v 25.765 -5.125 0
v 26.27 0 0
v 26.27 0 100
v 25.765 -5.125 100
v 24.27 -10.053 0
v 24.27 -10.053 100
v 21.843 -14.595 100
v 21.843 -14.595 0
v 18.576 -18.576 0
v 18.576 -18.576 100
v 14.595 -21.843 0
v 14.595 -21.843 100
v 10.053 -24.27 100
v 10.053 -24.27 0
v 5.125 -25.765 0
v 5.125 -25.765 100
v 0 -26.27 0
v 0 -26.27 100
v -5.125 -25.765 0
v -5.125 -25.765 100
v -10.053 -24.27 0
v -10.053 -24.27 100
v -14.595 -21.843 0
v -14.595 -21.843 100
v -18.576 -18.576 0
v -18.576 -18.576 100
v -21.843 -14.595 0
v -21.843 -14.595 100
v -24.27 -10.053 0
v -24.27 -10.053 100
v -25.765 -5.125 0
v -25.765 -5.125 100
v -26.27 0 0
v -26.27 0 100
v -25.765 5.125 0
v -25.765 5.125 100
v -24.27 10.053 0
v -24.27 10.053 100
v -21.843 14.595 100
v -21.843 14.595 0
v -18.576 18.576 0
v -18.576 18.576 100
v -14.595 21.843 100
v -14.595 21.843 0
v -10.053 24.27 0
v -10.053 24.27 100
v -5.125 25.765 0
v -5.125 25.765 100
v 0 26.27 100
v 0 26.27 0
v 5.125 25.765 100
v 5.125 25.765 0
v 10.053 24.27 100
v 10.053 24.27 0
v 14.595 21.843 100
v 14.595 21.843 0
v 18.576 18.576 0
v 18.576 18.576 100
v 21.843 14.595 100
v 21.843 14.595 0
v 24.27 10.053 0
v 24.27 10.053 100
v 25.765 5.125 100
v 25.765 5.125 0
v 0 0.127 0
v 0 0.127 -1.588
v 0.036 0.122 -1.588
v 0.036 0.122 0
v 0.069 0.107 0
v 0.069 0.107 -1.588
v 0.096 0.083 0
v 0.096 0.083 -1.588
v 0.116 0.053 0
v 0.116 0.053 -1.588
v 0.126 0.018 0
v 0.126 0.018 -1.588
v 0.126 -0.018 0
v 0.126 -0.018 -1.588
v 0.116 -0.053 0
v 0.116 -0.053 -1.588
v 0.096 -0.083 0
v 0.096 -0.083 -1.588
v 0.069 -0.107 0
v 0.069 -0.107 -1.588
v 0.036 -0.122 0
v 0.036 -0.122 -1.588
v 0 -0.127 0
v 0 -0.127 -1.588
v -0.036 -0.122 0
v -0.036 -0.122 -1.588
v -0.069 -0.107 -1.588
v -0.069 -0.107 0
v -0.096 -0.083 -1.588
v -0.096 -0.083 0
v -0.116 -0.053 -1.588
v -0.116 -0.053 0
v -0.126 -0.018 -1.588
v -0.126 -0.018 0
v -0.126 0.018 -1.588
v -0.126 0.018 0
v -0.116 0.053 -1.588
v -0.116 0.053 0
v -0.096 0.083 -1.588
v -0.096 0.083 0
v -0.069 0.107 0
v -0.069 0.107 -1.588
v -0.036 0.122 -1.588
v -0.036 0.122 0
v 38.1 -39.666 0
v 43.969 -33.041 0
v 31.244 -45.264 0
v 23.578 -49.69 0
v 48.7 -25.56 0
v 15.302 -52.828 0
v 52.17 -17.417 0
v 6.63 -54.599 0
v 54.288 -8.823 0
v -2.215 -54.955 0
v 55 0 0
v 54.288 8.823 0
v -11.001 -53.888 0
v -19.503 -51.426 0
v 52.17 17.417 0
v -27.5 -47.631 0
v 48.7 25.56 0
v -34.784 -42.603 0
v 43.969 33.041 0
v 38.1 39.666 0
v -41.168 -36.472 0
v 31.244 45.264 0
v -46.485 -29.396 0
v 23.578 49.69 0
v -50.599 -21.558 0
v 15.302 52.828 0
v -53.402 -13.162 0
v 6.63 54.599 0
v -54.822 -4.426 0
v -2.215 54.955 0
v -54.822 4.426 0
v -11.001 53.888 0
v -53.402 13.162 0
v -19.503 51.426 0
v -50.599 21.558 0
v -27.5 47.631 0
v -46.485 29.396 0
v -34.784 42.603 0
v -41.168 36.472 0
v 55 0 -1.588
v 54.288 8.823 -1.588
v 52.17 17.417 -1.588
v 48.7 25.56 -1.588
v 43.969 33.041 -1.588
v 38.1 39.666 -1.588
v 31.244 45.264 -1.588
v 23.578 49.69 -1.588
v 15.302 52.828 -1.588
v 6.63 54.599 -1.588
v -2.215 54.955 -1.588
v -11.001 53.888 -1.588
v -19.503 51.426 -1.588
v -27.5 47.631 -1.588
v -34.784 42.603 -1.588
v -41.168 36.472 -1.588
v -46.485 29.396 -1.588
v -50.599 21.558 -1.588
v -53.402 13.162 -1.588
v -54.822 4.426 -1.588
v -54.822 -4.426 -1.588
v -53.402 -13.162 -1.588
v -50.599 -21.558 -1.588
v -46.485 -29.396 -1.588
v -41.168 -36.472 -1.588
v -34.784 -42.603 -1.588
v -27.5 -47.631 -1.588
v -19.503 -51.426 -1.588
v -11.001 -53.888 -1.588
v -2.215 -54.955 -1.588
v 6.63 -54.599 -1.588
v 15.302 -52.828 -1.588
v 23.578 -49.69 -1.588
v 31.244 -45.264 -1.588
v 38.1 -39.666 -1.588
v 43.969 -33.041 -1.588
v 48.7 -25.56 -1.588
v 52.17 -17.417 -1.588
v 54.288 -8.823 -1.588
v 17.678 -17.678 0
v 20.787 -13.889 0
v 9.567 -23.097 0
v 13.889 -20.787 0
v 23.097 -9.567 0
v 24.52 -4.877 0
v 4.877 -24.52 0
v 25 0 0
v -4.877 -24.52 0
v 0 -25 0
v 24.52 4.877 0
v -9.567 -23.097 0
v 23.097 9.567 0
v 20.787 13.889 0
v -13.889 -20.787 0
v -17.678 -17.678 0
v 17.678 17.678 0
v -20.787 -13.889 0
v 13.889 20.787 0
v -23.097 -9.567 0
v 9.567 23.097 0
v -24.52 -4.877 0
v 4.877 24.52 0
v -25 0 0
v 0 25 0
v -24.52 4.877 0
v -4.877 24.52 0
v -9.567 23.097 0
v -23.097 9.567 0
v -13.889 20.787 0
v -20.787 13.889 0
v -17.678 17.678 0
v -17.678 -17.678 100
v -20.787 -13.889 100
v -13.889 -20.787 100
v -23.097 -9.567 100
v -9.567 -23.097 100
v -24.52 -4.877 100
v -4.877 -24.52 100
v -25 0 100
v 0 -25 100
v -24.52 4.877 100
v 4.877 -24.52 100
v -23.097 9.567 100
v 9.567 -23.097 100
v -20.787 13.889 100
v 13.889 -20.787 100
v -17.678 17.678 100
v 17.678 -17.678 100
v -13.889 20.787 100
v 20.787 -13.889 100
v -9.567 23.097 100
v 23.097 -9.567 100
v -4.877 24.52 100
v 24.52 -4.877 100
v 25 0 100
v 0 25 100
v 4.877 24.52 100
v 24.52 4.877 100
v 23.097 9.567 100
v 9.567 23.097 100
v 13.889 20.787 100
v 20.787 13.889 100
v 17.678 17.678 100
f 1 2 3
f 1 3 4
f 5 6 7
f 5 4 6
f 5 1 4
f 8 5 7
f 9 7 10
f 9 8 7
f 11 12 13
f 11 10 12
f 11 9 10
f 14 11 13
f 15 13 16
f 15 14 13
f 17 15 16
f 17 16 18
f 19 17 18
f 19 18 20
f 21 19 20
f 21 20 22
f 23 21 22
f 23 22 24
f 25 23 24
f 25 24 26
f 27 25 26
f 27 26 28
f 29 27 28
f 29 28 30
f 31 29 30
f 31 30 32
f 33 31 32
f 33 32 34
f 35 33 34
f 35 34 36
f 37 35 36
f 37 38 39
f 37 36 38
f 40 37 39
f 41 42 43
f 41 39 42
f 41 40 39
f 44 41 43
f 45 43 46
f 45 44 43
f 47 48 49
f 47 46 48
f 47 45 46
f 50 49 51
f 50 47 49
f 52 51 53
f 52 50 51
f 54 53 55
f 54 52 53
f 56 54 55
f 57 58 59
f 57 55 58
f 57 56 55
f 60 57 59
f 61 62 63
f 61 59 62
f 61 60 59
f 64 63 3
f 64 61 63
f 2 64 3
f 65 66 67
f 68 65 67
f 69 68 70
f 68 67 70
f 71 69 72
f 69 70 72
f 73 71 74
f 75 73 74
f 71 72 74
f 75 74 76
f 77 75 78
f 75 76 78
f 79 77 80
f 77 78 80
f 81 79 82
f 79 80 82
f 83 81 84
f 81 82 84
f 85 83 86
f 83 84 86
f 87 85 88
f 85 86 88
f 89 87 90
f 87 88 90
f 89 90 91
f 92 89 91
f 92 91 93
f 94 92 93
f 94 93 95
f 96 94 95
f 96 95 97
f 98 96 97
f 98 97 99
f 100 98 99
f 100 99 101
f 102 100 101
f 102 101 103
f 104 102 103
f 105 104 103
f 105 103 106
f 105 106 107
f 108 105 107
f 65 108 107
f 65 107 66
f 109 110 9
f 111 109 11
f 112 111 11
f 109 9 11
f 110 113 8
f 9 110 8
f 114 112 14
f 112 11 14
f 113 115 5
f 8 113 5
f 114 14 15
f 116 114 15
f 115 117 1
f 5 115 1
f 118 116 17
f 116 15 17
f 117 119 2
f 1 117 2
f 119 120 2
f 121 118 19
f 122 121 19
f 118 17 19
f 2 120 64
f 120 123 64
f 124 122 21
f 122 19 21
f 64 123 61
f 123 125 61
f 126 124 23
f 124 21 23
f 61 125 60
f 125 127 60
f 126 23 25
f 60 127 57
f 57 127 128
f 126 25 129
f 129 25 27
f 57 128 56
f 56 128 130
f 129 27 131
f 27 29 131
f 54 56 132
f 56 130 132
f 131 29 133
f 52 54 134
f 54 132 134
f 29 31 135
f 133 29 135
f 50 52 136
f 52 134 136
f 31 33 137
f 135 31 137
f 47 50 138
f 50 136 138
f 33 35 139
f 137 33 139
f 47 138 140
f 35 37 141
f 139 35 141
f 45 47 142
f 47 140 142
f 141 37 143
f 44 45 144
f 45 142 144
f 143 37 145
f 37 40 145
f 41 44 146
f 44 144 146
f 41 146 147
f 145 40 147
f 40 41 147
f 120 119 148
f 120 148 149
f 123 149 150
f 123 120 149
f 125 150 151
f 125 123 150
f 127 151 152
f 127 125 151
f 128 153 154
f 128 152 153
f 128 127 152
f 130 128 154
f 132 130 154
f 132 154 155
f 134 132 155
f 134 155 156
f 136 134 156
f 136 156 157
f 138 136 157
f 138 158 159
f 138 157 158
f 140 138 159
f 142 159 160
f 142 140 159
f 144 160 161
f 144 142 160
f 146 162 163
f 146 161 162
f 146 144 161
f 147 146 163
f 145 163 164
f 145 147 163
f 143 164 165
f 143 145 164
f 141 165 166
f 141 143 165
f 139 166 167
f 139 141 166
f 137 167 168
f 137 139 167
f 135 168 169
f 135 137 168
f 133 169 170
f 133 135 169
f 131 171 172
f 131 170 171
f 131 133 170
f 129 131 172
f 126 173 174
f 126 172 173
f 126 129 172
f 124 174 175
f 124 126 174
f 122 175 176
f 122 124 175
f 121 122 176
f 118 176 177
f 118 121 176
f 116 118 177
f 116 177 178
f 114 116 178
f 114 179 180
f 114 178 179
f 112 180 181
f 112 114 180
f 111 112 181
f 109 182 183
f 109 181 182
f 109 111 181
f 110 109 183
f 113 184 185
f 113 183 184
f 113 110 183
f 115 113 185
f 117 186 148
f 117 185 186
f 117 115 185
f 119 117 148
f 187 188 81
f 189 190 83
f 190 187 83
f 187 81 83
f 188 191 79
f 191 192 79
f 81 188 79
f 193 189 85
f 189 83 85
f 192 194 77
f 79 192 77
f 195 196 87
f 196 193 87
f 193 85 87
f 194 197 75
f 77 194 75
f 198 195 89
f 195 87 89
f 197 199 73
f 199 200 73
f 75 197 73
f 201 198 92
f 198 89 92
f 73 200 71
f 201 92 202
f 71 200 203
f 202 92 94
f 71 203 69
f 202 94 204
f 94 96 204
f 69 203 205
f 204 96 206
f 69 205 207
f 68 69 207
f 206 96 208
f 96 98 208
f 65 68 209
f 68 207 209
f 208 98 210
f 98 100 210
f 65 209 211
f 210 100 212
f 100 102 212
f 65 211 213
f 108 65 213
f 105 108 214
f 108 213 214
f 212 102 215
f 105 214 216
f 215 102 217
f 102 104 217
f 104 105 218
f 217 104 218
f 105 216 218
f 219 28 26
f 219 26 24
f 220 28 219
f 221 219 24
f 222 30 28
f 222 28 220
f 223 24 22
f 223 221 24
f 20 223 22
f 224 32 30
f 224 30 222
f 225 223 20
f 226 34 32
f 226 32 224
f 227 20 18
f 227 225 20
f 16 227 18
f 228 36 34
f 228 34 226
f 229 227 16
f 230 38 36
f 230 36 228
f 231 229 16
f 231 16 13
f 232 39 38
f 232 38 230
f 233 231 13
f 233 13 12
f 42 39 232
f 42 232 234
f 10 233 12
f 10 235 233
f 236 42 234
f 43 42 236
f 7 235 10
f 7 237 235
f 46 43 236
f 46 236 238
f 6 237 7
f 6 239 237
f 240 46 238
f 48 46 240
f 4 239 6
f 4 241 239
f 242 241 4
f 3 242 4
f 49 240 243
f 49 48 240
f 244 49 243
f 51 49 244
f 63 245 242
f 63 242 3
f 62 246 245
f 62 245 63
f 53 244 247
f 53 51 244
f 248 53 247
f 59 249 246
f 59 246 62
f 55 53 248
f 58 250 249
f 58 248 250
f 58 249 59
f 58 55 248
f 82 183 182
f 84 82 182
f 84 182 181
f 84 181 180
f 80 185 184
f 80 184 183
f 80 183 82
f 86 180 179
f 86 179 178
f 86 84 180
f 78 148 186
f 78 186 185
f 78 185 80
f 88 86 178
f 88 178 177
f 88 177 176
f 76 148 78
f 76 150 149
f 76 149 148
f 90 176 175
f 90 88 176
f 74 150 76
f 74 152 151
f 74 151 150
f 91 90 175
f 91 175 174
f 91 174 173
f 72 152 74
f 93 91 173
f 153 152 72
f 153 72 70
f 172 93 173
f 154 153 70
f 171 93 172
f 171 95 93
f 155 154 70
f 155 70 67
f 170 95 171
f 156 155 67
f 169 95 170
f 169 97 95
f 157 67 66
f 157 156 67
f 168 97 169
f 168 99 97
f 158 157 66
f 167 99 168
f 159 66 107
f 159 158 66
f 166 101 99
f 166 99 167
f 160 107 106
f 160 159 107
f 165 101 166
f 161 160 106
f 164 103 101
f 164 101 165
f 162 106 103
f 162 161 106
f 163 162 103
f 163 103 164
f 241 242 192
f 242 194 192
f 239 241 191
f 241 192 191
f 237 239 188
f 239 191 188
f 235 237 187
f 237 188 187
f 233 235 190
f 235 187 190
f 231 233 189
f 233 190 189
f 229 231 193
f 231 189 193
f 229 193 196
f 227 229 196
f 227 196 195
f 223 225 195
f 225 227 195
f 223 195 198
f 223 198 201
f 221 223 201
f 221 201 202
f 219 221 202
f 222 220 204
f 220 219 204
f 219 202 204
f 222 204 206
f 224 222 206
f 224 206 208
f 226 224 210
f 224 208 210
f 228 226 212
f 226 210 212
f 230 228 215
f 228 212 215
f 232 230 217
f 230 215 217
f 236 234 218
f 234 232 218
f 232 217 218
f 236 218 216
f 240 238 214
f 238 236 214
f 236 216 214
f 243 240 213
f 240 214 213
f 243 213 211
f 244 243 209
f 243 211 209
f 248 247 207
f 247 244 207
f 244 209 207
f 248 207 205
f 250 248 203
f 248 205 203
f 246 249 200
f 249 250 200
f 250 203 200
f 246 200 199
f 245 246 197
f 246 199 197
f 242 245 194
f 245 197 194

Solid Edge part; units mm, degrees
sketch "Sketch1" plane through (0, 0, 0) normal (0, 0, 1) x (1, 0, 0)
  circle A0 centre (0, 0) radius 25
  circle A1 centre (0, 0) radius 26.27
  dimension "D1" = 50
  dimension "D2" = 1.27
extrude "Protrusion1" add sketch "Sketch1" along normal blind 100
sketch "Sketch2" plane through (0, 0, 0) normal (0, 0, -1) x (1, 0, 0)
  circle A0 centre (0, 0) radius 55
extrude "ExtrudedProtrusion_2" add sketch "Sketch2" along normal blind 1.5875
sketch "Sketch3" plane through (0, 0, -1.5875) normal (0, 0, -1) x (0, 1, 0)
  circle A0 centre (0, 0) radius 0.127
extrude "Cutout1" cut sketch "Sketch3" against normal through all
